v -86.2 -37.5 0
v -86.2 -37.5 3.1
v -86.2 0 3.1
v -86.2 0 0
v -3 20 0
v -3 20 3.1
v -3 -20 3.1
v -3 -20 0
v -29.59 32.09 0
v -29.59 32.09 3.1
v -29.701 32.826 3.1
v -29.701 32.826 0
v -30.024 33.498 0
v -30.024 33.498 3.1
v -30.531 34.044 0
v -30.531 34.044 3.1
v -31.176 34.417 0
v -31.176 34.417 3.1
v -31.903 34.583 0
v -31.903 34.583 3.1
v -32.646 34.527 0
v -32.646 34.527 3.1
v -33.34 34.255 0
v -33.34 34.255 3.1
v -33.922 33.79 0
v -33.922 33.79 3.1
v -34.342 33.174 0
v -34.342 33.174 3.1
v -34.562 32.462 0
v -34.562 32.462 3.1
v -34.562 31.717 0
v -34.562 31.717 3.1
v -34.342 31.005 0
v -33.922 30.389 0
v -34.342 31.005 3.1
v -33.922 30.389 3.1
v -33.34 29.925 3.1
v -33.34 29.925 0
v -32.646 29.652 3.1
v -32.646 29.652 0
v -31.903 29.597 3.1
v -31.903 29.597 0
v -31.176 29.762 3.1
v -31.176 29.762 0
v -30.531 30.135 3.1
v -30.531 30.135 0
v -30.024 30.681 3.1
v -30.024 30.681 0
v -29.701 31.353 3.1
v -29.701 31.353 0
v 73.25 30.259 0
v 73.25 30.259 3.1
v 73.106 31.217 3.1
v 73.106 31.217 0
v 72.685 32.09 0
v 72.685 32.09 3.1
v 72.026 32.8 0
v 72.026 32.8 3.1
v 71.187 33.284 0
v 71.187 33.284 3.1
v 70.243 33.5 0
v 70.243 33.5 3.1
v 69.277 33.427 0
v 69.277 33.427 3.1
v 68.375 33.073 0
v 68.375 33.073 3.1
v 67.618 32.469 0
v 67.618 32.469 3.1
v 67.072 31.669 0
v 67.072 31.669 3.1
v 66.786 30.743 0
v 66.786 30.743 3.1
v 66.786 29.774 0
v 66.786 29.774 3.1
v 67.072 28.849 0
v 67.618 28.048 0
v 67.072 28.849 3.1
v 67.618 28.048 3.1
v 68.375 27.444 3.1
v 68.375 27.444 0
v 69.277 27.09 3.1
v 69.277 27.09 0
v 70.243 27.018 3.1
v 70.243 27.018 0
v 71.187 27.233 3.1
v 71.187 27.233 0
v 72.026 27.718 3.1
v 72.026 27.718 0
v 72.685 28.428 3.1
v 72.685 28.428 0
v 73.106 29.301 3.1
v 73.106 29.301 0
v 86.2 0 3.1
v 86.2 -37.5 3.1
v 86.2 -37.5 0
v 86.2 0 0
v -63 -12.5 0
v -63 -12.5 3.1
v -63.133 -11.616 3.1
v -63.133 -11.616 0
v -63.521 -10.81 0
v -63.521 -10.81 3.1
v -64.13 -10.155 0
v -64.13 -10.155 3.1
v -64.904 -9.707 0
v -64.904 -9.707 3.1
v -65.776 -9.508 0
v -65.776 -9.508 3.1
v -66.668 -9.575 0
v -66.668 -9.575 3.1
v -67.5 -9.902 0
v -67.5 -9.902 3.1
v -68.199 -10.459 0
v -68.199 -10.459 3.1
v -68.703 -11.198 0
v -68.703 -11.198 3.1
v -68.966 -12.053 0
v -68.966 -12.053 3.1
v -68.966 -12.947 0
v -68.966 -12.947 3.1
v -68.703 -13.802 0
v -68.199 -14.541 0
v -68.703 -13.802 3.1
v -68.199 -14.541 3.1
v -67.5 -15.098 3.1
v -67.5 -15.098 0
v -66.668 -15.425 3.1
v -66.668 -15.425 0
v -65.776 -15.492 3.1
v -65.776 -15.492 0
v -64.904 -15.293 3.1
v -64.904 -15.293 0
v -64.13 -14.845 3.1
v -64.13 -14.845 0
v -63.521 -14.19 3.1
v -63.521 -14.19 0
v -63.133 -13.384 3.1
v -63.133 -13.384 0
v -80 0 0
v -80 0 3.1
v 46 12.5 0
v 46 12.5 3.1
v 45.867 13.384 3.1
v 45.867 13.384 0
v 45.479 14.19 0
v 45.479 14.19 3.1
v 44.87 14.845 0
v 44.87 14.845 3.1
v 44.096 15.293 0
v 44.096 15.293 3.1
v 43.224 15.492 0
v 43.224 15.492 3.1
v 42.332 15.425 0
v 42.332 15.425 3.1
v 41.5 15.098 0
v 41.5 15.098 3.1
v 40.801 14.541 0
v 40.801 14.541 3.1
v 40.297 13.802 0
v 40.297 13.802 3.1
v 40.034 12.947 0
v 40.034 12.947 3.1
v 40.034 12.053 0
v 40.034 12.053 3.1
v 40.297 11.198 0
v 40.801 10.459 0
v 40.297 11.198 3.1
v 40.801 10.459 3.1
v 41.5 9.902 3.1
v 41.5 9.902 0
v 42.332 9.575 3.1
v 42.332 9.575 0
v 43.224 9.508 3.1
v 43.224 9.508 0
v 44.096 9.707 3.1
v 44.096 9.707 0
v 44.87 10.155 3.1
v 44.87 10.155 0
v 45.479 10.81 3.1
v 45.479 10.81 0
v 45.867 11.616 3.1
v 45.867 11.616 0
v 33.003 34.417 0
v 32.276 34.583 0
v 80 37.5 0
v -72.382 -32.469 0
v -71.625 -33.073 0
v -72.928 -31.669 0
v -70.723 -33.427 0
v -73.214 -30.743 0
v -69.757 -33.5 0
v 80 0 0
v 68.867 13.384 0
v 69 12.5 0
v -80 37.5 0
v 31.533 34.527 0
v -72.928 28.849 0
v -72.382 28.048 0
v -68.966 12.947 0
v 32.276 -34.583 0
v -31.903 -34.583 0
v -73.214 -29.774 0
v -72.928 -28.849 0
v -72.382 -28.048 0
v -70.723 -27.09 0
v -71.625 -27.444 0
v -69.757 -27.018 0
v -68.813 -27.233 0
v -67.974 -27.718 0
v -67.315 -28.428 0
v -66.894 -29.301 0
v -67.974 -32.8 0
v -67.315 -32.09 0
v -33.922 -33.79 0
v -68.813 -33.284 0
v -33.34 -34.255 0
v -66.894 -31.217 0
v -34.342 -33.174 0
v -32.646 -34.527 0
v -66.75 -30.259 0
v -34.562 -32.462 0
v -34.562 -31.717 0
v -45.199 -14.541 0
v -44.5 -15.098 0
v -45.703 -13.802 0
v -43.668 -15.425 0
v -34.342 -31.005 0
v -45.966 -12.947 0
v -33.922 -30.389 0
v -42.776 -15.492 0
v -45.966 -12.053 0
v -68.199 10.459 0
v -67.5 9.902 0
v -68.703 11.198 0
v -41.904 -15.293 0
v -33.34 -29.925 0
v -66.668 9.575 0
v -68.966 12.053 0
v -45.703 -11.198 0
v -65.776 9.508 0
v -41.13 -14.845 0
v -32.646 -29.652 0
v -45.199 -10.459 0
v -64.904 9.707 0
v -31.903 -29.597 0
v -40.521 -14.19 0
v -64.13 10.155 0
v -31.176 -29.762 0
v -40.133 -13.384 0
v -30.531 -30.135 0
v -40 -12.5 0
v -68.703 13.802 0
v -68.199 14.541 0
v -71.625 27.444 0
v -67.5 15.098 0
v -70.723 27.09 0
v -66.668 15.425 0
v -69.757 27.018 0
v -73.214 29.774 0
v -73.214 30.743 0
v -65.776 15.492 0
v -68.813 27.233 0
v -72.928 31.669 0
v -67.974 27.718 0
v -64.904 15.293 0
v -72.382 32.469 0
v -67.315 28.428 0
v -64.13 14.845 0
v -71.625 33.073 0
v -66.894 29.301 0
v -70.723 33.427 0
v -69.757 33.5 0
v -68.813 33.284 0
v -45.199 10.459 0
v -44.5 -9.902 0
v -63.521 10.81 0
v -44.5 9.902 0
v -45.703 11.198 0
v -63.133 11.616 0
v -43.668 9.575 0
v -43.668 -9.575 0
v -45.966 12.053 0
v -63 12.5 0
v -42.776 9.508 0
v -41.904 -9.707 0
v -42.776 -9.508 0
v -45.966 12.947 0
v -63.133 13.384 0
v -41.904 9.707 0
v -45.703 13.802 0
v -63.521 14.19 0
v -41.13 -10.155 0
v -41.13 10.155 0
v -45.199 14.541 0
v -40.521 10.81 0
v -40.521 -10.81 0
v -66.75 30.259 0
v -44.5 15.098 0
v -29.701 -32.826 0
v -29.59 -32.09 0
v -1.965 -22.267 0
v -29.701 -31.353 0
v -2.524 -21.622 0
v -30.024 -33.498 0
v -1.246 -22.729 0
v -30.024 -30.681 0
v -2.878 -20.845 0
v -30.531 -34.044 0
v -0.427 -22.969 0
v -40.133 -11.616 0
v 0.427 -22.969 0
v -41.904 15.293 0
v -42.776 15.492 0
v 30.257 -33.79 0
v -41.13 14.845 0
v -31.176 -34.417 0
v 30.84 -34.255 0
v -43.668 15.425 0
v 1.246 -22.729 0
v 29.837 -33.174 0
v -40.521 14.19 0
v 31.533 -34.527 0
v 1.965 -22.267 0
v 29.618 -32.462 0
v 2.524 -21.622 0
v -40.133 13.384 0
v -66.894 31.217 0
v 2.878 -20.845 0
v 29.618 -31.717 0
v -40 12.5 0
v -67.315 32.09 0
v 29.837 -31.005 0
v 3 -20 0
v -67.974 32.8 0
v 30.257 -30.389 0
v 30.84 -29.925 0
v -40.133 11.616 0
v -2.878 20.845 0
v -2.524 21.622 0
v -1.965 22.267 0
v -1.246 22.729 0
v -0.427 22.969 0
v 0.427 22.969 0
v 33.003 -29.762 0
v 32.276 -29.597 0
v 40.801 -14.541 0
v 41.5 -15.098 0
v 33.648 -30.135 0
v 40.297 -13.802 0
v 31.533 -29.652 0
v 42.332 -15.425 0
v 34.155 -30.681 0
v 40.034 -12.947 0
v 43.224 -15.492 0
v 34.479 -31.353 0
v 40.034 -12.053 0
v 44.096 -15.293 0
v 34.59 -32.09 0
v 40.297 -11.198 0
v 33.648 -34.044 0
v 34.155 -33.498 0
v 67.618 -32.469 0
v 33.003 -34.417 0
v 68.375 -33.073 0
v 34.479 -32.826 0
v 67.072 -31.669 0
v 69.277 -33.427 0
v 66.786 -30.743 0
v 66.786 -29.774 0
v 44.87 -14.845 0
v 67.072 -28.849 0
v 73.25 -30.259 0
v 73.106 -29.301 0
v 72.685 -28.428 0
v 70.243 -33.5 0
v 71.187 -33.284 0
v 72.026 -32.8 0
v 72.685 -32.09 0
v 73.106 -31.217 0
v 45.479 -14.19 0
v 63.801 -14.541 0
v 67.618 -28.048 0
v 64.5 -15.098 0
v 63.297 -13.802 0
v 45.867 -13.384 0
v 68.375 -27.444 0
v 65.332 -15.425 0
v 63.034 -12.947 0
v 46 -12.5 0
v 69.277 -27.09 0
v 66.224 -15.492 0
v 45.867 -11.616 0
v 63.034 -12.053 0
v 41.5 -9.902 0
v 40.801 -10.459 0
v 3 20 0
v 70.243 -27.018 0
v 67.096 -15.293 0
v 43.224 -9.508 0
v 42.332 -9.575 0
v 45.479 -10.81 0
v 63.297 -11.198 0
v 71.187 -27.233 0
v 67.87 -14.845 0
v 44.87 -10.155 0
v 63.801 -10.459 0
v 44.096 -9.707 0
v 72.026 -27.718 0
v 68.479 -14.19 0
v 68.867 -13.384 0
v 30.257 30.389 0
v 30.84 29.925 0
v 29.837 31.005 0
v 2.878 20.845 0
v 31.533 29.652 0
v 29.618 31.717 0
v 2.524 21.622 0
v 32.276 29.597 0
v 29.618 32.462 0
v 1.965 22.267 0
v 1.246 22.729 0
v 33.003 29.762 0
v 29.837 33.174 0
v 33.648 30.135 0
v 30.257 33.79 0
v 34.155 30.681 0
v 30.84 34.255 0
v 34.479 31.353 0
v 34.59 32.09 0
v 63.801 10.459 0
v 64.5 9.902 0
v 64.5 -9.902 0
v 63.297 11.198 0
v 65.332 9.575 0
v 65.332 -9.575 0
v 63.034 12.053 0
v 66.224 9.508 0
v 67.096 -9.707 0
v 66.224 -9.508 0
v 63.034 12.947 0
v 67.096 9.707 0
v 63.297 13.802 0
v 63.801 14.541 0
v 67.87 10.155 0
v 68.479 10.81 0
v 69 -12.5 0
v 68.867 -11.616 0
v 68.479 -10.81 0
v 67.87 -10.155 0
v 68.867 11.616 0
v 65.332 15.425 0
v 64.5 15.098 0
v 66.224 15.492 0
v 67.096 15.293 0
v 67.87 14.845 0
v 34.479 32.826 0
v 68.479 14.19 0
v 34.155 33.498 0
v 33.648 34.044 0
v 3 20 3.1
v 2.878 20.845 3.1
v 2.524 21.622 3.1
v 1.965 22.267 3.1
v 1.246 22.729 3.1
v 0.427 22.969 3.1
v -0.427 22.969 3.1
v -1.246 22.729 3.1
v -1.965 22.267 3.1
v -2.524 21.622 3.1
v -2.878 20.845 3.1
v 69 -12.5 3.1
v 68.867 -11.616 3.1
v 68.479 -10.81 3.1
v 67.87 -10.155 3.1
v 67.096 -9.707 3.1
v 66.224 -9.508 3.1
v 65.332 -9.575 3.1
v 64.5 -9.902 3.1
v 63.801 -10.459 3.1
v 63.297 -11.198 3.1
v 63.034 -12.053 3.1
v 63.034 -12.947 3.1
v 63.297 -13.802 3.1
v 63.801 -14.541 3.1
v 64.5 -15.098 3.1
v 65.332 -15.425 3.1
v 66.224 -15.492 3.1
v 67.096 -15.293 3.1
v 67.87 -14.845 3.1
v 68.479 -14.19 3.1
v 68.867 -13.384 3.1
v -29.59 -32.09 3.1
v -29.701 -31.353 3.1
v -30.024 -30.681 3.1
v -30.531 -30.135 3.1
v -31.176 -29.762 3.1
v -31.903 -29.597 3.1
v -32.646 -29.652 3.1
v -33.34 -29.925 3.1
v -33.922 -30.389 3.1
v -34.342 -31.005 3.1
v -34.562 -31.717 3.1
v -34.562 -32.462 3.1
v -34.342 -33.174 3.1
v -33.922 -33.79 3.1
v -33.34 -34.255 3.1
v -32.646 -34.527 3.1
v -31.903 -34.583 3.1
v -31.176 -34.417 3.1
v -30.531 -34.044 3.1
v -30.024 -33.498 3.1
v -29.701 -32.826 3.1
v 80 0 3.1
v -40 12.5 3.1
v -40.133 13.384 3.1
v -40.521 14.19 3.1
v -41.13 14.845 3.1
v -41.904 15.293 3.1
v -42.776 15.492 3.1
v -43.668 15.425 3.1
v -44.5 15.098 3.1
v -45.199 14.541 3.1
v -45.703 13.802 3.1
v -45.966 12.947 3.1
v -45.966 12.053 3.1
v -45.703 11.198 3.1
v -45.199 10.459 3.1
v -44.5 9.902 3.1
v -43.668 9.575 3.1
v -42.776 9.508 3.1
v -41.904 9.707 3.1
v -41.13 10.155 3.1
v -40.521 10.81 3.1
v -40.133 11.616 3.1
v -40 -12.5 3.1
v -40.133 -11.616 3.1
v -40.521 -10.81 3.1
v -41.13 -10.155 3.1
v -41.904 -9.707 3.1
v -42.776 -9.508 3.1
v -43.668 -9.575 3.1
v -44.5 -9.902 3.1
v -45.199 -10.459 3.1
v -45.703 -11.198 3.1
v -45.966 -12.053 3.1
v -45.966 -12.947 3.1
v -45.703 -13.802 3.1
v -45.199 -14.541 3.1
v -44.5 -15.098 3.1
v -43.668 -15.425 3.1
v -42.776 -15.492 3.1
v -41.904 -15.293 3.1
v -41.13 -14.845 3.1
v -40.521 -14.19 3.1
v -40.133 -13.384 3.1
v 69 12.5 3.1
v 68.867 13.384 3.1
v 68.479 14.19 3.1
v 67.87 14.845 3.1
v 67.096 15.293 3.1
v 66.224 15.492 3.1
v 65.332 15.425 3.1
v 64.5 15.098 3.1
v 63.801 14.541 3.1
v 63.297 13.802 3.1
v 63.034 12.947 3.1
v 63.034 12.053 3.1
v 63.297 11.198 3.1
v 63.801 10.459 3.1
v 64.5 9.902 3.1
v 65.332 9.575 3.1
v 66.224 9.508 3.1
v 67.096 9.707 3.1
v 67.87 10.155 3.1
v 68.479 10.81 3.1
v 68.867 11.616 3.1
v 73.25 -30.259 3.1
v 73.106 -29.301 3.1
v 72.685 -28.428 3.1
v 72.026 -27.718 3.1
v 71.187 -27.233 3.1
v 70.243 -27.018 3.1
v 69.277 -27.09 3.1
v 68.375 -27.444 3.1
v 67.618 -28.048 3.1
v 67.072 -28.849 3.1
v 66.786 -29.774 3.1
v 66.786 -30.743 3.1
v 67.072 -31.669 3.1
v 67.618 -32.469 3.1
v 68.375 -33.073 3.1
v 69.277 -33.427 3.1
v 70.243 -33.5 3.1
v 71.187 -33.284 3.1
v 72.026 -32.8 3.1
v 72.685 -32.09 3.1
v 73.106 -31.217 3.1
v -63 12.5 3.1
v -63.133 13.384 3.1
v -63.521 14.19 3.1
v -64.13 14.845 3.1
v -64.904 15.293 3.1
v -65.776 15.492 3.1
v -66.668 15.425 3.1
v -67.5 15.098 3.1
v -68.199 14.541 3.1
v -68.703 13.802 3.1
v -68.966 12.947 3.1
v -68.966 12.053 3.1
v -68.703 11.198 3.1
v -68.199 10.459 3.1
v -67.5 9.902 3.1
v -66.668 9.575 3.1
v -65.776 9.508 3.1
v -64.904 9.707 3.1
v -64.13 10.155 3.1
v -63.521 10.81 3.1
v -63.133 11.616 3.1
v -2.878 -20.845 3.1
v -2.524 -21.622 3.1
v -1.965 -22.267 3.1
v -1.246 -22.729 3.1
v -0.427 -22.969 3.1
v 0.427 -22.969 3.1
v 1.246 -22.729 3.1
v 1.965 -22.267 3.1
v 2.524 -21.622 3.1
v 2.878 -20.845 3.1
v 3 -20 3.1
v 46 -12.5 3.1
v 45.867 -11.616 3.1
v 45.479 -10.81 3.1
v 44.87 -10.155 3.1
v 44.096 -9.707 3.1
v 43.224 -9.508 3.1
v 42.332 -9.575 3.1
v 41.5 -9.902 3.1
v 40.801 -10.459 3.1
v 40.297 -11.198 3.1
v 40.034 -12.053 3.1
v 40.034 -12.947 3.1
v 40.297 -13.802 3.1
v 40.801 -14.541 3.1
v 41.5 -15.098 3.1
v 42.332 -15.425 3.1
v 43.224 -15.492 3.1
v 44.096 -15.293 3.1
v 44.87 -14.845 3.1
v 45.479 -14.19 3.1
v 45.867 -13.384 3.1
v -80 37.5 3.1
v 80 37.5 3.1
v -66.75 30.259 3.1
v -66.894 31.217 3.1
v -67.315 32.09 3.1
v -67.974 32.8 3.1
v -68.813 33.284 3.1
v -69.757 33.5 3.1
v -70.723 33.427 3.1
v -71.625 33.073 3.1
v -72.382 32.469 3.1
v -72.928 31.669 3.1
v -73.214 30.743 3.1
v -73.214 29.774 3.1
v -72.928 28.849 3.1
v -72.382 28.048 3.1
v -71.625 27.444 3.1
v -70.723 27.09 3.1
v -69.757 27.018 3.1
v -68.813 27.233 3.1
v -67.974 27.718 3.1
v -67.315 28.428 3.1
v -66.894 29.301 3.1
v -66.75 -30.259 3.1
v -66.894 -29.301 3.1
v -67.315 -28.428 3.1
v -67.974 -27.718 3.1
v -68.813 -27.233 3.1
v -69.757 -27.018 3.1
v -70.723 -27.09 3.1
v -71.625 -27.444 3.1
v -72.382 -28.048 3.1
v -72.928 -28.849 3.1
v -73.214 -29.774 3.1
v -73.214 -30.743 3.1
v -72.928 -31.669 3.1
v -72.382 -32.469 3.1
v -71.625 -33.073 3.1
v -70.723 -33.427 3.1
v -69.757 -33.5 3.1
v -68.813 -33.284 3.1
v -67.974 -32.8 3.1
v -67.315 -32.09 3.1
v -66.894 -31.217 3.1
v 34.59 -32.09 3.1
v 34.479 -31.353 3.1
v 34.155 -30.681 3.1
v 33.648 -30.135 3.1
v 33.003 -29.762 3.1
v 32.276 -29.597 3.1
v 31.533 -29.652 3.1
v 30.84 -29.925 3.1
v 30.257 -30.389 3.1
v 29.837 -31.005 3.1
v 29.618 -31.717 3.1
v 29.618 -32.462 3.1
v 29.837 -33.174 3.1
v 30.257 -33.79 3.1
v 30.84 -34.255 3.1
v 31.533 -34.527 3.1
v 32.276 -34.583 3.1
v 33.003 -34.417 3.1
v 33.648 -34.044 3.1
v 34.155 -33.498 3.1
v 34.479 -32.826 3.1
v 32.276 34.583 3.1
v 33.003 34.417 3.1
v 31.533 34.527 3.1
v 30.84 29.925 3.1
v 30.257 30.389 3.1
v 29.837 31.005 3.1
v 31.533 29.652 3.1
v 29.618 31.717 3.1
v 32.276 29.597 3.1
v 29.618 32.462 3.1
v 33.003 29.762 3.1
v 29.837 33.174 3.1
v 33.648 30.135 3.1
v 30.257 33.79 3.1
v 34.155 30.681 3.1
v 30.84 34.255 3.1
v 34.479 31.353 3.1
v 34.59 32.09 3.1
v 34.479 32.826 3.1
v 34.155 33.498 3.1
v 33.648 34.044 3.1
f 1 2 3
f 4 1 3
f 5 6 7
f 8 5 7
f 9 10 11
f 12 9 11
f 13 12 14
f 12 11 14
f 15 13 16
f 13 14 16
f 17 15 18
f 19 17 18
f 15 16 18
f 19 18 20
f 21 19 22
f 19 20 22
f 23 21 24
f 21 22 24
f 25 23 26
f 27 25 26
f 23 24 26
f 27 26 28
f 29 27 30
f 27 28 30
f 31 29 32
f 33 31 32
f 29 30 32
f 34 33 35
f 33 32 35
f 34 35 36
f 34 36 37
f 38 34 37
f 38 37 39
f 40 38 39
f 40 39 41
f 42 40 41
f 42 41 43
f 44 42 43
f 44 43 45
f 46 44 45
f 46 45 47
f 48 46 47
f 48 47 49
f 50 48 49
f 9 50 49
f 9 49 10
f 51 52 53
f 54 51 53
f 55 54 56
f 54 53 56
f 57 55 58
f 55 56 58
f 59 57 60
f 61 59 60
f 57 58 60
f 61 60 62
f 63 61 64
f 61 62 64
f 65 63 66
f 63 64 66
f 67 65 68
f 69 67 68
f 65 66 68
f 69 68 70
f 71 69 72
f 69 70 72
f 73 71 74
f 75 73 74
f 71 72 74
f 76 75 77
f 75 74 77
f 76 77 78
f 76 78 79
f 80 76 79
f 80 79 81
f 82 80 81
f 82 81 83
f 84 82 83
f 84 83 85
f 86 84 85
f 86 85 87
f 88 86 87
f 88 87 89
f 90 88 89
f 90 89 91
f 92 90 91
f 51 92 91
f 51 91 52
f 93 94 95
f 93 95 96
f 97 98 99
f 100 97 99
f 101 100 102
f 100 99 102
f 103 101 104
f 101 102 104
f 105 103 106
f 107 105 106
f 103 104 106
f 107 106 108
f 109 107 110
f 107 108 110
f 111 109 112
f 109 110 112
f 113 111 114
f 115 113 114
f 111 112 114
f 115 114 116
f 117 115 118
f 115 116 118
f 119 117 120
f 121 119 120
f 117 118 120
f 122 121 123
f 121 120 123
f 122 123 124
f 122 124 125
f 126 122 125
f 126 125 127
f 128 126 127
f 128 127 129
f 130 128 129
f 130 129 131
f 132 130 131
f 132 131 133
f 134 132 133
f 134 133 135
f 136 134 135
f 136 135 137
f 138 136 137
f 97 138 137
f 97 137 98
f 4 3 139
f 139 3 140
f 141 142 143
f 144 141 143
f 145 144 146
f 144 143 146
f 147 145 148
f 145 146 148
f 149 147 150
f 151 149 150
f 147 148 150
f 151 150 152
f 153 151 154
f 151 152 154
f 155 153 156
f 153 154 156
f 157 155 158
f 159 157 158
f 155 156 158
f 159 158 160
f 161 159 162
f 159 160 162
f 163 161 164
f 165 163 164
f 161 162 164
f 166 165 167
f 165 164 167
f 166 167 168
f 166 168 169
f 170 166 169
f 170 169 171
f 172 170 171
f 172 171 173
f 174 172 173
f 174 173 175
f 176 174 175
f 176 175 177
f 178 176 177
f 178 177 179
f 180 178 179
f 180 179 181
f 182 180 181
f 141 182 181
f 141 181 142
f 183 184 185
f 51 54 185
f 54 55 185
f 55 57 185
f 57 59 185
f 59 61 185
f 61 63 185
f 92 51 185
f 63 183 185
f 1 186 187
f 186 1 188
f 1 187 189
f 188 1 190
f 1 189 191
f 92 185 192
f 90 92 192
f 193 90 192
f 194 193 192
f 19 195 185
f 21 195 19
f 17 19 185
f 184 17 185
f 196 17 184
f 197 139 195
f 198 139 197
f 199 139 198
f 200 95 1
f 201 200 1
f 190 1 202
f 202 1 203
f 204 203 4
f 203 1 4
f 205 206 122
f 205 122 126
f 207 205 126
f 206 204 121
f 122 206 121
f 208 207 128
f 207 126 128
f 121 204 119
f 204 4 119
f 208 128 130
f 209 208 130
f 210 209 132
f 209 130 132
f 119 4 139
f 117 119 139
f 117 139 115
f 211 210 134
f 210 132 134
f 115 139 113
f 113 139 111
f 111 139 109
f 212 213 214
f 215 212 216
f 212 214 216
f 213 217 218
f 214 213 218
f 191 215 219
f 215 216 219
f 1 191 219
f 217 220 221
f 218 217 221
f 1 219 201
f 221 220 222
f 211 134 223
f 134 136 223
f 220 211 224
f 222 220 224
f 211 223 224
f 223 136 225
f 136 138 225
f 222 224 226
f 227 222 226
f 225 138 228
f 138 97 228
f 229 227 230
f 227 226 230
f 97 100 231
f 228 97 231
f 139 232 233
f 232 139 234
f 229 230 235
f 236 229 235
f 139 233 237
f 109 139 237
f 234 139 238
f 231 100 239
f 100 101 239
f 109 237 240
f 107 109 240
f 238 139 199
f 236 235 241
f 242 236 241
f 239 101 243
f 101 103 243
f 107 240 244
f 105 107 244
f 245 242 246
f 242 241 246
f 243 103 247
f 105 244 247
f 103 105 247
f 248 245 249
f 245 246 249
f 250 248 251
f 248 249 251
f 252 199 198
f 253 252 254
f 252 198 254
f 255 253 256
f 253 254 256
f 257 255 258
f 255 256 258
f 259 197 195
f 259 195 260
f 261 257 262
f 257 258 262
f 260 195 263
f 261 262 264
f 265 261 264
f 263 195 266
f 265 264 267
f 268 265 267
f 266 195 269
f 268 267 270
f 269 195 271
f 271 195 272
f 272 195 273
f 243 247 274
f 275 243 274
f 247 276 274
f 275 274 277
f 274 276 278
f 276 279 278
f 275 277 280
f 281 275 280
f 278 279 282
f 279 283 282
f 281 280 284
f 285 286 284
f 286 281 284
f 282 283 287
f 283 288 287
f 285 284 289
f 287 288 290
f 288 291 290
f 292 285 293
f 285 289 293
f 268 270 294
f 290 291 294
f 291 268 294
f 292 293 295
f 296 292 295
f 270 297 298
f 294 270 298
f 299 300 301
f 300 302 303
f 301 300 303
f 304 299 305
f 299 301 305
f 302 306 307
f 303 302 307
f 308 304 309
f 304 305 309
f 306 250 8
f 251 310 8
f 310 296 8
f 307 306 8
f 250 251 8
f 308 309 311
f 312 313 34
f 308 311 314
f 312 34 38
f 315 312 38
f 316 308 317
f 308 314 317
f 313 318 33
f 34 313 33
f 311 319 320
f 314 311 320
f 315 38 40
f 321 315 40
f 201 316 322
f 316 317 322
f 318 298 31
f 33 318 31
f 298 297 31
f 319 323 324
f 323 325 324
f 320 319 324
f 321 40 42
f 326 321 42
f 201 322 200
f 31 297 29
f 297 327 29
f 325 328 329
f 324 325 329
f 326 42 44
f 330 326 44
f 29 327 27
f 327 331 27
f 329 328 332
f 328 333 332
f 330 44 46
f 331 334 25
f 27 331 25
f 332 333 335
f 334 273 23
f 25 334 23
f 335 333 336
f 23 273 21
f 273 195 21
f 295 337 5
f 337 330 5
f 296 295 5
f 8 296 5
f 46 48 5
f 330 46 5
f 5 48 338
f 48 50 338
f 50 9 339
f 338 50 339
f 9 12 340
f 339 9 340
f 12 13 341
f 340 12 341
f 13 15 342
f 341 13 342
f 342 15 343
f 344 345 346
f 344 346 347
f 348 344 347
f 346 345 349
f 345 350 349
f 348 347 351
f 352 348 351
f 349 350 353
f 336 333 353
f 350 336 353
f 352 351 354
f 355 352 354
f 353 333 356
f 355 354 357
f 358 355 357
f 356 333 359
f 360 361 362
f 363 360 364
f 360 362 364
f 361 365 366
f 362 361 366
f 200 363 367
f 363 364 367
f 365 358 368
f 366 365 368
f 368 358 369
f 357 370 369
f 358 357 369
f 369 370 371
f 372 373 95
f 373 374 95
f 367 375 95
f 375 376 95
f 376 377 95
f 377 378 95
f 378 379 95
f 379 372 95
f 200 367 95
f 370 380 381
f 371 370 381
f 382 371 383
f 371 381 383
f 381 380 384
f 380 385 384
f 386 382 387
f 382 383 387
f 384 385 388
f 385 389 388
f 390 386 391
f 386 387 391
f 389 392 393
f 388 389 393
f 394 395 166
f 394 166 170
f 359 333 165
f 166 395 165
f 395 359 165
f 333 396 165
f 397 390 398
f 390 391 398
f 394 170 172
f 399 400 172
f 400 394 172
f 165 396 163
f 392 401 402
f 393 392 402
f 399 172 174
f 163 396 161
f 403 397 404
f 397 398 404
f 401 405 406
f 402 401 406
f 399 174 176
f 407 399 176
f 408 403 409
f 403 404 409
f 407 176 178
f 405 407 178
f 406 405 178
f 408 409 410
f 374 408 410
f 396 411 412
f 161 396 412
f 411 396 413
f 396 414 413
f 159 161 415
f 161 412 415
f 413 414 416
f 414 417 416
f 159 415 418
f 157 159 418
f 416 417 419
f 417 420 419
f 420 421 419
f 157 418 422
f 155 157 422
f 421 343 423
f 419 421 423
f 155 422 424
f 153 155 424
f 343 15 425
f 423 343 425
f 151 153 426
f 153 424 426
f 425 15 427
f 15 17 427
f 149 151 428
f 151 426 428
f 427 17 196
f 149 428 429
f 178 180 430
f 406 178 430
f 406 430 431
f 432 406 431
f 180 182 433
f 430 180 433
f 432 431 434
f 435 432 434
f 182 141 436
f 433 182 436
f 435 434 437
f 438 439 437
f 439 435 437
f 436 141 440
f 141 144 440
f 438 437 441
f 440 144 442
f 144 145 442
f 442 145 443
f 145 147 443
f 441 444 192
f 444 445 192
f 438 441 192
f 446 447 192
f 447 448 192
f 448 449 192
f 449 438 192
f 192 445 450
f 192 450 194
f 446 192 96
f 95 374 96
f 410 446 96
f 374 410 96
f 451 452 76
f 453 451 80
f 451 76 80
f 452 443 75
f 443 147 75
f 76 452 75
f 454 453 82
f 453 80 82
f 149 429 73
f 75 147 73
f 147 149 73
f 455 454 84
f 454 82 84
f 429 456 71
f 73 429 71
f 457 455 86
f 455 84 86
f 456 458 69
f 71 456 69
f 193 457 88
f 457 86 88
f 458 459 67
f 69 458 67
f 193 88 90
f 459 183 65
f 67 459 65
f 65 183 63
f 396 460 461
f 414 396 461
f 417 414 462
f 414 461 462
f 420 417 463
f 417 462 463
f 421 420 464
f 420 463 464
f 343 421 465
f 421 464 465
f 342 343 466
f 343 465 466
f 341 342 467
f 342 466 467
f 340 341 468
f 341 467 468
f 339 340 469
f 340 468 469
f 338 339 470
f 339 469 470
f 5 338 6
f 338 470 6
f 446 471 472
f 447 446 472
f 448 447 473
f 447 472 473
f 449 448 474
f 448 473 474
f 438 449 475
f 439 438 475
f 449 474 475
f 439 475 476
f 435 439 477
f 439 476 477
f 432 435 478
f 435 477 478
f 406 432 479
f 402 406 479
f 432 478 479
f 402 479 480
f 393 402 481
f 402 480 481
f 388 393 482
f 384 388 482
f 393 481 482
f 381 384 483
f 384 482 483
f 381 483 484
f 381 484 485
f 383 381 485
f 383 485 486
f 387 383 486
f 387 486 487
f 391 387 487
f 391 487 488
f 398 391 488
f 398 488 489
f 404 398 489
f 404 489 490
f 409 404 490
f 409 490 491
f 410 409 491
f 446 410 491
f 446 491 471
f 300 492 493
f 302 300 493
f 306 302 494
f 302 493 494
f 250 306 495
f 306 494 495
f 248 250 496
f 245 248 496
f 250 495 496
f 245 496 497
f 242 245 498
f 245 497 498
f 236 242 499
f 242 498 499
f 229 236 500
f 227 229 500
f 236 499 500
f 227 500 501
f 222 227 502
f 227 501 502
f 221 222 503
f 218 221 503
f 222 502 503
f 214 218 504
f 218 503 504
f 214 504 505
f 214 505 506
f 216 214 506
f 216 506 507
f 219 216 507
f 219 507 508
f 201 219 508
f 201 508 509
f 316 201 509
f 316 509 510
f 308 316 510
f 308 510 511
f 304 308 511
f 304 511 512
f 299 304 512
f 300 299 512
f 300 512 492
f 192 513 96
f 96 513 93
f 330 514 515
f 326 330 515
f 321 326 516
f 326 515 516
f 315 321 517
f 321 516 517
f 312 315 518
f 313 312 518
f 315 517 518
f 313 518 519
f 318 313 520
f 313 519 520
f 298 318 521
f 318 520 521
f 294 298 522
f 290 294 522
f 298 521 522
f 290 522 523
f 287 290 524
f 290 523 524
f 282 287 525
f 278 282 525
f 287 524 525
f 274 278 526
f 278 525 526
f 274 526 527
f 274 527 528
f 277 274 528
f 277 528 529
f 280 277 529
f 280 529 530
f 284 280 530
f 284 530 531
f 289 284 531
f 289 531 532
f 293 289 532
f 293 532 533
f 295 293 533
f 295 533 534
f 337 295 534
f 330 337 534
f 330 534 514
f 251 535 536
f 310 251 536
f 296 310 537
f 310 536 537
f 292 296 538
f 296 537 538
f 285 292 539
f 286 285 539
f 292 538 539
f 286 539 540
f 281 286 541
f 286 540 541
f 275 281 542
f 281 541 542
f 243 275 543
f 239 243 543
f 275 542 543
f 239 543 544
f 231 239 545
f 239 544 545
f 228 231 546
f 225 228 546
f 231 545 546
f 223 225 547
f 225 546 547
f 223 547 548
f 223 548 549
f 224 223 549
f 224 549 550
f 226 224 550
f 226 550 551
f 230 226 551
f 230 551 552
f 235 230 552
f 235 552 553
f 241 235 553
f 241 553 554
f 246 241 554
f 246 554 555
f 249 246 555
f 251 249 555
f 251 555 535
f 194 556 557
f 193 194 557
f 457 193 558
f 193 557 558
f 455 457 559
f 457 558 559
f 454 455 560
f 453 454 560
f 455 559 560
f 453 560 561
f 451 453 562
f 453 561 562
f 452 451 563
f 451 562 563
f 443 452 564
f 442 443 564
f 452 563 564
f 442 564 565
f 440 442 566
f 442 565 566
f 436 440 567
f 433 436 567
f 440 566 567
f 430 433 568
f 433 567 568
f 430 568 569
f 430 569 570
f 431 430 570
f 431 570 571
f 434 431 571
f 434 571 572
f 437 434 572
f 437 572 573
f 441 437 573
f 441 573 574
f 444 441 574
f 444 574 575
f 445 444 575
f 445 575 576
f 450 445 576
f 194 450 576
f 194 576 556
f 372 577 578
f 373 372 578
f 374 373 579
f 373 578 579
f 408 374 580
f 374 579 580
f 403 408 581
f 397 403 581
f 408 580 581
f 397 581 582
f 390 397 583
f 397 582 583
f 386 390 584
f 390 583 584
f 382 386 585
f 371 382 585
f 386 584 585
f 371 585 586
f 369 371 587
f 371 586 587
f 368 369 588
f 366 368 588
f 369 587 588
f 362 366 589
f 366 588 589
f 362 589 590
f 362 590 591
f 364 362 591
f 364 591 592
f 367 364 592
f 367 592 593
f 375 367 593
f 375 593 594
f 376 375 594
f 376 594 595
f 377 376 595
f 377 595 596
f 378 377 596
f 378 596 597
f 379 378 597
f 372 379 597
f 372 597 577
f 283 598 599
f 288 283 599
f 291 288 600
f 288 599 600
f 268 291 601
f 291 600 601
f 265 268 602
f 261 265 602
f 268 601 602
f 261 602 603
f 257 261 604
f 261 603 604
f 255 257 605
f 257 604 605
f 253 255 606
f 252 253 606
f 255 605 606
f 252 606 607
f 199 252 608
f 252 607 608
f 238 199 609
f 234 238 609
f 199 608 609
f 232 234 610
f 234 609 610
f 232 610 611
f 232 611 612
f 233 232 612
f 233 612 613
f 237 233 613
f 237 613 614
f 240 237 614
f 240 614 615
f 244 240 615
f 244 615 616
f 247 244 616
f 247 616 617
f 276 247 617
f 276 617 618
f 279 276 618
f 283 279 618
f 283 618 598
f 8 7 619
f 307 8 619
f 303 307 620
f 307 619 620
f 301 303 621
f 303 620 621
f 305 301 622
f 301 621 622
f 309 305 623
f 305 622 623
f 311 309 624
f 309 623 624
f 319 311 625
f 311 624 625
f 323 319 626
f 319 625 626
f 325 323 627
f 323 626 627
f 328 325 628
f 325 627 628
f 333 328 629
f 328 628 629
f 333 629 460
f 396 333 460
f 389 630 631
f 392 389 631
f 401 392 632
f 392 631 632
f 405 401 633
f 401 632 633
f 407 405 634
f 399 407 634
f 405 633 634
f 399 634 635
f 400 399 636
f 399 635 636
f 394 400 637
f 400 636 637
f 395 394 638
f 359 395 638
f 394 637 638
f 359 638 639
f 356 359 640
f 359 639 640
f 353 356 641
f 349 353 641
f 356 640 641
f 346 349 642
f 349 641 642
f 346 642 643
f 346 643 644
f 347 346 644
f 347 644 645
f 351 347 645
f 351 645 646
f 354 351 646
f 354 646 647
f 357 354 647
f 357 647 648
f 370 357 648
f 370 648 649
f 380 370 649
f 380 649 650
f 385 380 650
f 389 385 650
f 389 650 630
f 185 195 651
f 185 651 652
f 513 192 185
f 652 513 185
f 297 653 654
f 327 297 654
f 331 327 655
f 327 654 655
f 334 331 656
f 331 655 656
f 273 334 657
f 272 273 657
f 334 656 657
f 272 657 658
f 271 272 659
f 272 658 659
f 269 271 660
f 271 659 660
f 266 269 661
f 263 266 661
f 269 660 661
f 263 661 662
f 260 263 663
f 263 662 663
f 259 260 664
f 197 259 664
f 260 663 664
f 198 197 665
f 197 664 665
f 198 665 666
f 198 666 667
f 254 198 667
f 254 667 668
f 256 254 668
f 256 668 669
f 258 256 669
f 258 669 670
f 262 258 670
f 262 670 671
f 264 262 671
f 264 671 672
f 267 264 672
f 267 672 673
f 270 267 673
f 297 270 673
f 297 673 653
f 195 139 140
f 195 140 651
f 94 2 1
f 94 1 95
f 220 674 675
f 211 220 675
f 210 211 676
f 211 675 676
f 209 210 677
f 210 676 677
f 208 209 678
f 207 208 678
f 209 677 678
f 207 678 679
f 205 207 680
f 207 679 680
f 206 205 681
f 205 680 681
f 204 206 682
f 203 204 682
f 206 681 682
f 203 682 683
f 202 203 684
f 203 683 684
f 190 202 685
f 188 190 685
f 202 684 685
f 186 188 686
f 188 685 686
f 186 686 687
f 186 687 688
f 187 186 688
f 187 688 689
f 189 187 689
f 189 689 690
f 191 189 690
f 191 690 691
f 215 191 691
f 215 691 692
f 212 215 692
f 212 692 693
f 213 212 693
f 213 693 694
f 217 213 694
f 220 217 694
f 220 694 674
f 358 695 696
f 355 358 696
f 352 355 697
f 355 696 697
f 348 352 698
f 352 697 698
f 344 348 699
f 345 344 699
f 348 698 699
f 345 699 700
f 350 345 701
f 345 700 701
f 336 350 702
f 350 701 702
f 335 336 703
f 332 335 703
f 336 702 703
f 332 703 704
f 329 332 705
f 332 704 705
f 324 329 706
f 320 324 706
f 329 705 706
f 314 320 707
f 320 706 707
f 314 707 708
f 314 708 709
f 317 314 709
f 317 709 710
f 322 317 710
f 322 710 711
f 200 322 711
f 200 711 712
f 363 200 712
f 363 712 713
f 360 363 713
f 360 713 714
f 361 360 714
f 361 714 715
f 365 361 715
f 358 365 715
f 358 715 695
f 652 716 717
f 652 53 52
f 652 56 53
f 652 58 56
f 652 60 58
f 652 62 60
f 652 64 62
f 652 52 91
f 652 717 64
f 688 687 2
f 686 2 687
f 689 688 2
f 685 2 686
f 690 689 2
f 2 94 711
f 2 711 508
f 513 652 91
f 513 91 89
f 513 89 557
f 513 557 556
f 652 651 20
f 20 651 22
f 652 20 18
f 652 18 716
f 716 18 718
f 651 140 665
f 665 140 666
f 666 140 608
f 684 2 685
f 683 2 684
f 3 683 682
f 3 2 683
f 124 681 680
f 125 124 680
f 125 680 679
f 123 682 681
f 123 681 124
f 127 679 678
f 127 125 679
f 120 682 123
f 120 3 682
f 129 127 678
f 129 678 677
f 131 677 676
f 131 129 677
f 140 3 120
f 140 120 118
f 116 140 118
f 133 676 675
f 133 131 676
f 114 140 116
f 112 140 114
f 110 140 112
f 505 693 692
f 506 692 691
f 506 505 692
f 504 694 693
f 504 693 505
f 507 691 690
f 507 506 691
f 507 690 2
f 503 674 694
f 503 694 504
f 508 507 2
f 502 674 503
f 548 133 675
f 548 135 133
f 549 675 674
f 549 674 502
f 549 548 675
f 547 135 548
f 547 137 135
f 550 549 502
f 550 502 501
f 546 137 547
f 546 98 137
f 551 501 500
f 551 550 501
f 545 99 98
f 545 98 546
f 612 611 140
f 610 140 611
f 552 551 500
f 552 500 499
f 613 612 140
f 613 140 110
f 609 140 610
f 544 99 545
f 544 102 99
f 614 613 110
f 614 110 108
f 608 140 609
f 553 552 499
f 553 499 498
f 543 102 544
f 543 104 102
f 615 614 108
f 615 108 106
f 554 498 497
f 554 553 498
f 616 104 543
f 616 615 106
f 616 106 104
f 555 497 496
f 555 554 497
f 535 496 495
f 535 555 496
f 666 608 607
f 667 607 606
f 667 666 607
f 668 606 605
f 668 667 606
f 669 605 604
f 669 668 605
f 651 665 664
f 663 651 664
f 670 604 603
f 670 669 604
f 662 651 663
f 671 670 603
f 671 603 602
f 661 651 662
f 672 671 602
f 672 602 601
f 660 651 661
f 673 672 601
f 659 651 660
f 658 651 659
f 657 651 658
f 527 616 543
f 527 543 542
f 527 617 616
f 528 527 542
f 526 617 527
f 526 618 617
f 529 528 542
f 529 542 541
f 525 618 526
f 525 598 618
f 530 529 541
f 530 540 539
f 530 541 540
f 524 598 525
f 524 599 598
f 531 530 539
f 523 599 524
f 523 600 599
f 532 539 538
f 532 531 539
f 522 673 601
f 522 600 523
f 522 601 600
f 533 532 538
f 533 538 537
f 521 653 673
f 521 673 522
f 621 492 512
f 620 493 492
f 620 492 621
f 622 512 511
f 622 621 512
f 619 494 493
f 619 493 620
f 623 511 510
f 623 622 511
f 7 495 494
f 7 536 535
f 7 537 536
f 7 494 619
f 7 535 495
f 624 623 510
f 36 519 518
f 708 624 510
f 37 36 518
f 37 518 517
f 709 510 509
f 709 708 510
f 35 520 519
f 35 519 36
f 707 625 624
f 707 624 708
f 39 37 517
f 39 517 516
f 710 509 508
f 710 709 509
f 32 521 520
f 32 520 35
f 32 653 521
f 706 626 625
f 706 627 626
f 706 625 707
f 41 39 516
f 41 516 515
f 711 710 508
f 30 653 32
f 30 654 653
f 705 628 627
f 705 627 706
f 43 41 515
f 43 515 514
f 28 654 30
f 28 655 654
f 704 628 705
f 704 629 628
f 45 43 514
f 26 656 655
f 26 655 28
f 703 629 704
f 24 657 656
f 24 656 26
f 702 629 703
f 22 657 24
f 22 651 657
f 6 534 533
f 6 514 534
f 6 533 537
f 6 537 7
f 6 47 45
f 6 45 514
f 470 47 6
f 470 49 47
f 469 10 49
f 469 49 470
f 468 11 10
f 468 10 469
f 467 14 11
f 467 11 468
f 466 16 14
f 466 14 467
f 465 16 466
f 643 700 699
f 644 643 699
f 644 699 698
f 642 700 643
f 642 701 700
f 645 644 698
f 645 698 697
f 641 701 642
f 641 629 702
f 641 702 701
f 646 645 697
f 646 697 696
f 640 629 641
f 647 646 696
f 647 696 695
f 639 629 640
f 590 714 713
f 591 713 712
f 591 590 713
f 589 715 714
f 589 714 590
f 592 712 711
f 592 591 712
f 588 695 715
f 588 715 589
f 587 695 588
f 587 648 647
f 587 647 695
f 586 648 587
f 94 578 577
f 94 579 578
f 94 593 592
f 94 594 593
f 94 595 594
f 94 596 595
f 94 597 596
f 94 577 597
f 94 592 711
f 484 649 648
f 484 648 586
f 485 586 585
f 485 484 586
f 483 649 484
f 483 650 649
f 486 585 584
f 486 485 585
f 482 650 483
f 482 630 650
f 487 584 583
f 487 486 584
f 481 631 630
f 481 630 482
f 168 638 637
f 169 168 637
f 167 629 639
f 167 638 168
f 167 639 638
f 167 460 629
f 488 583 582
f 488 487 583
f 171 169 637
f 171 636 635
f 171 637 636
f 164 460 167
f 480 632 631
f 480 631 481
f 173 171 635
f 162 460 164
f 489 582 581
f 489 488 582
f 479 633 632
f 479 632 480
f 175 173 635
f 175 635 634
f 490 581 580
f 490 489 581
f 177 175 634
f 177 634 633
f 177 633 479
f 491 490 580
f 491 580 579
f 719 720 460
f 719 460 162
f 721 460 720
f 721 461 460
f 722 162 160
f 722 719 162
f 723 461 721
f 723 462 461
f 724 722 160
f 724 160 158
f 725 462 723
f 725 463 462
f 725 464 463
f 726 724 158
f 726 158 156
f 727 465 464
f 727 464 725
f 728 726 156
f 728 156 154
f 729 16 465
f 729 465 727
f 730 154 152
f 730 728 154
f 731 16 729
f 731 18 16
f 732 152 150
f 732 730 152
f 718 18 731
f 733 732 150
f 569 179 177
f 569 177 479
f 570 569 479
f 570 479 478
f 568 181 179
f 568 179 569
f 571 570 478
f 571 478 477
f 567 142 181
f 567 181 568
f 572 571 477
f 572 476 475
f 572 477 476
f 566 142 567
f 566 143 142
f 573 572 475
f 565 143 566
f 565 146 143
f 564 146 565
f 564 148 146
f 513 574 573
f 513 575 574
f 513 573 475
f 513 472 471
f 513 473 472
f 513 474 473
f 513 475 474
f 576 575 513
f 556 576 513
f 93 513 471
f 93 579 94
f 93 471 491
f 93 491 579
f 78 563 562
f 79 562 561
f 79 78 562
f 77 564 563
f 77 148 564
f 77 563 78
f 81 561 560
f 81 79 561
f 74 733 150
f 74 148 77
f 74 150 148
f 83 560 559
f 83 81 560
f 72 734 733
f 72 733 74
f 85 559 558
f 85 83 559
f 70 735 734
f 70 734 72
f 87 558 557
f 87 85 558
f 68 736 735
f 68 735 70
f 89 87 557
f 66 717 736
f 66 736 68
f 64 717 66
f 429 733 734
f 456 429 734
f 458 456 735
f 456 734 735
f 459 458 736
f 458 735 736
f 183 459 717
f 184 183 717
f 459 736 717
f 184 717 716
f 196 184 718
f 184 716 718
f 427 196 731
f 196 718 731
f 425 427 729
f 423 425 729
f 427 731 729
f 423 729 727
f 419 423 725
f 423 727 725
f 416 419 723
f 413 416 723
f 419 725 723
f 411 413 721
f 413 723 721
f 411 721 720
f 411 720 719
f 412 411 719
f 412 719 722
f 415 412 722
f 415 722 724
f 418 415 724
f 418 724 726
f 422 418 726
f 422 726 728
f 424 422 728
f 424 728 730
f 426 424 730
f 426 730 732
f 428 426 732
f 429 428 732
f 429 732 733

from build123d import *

# Parameters (mm, degrees)
SKETCH1_W           = 160
SKETCH1_H           = 75
BOSS_EXTRUDE1_DEPTH = 3.1
SKETCH2_W           = 6.2
SKETCH2_H           = 37.5
BOSS_EXTRUDE2_DEPTH = 3.1
SKETCH3_R           = 2.5
SKETCH3_R_2         = 3
SKETCH3_R_3         = 3.25
CUT_EXTRUDE1_DEPTH  = 4.1


with BuildPart() as part:
    # Sketch1 → Boss-Extrude1 (new body)
    with BuildSketch(Plane.XY):
        Rectangle(SKETCH1_W, SKETCH1_H)
    extrude(amount=BOSS_EXTRUDE1_DEPTH)

    # Sketch2 → Boss-Extrude2 (add, through all)
    with BuildSketch(Plane.XY.offset(3.1)):
        with Locations((83.1, -18.75)):
            Rectangle(SKETCH2_W, SKETCH2_H)
        with Locations((-83.1, -18.75)):
            Rectangle(SKETCH2_W, SKETCH2_H)
    extrude(amount=-BOSS_EXTRUDE2_DEPTH)

    # Sketch3 → Cut-Extrude1 (cut, through all)
    with BuildSketch(Plane.XY.offset(3.1)):
        with Locations((32.08959236, 32.08959236)):
            Circle(SKETCH3_R)
        with Locations((32.08959236, -32.08959236)):
            Circle(SKETCH3_R)
        with Locations((-32.08959236, -32.08959236)):
            Circle(SKETCH3_R)
        with Locations((-32.08959236, 32.08959236)):
            Circle(SKETCH3_R)
        with Locations((-66, 12.5)):
            Circle(SKETCH3_R_2)
        with Locations((-43, 12.5)):
            Circle(SKETCH3_R_2)
        with Locations((-43, -12.5)):
            Circle(SKETCH3_R_2)
        with Locations((-66, -12.5)):
            Circle(SKETCH3_R_2)
        with Locations((43, 12.5)):
            Circle(SKETCH3_R_2)
        with Locations((66, 12.5)):
            Circle(SKETCH3_R_2)
        with Locations((66, -12.5)):
            Circle(SKETCH3_R_2)
        with Locations((43, -12.5)):
            Circle(SKETCH3_R_2)
        with Locations((-70, -30.258810311)):
            Circle(SKETCH3_R_3)
        with Locations((70, -30.258810311)):
            Circle(SKETCH3_R_3)
        with Locations((-70, 30.258810311)):
            Circle(SKETCH3_R_3)
        with Locations((70, 30.258810311)):
            Circle(SKETCH3_R_3)
        with BuildLine():
            Line((3, -20), (3, 20))
            ThreePointArc((3, 20), (0, 23), (-3, 20))
            Line((-3, 20), (-3, -20))
            ThreePointArc((-3, -20), (0, -23), (3, -20))
        make_face()
    extrude(amount=-CUT_EXTRUDE1_DEPTH, mode=Mode.SUBTRACT)


solid = part.part
